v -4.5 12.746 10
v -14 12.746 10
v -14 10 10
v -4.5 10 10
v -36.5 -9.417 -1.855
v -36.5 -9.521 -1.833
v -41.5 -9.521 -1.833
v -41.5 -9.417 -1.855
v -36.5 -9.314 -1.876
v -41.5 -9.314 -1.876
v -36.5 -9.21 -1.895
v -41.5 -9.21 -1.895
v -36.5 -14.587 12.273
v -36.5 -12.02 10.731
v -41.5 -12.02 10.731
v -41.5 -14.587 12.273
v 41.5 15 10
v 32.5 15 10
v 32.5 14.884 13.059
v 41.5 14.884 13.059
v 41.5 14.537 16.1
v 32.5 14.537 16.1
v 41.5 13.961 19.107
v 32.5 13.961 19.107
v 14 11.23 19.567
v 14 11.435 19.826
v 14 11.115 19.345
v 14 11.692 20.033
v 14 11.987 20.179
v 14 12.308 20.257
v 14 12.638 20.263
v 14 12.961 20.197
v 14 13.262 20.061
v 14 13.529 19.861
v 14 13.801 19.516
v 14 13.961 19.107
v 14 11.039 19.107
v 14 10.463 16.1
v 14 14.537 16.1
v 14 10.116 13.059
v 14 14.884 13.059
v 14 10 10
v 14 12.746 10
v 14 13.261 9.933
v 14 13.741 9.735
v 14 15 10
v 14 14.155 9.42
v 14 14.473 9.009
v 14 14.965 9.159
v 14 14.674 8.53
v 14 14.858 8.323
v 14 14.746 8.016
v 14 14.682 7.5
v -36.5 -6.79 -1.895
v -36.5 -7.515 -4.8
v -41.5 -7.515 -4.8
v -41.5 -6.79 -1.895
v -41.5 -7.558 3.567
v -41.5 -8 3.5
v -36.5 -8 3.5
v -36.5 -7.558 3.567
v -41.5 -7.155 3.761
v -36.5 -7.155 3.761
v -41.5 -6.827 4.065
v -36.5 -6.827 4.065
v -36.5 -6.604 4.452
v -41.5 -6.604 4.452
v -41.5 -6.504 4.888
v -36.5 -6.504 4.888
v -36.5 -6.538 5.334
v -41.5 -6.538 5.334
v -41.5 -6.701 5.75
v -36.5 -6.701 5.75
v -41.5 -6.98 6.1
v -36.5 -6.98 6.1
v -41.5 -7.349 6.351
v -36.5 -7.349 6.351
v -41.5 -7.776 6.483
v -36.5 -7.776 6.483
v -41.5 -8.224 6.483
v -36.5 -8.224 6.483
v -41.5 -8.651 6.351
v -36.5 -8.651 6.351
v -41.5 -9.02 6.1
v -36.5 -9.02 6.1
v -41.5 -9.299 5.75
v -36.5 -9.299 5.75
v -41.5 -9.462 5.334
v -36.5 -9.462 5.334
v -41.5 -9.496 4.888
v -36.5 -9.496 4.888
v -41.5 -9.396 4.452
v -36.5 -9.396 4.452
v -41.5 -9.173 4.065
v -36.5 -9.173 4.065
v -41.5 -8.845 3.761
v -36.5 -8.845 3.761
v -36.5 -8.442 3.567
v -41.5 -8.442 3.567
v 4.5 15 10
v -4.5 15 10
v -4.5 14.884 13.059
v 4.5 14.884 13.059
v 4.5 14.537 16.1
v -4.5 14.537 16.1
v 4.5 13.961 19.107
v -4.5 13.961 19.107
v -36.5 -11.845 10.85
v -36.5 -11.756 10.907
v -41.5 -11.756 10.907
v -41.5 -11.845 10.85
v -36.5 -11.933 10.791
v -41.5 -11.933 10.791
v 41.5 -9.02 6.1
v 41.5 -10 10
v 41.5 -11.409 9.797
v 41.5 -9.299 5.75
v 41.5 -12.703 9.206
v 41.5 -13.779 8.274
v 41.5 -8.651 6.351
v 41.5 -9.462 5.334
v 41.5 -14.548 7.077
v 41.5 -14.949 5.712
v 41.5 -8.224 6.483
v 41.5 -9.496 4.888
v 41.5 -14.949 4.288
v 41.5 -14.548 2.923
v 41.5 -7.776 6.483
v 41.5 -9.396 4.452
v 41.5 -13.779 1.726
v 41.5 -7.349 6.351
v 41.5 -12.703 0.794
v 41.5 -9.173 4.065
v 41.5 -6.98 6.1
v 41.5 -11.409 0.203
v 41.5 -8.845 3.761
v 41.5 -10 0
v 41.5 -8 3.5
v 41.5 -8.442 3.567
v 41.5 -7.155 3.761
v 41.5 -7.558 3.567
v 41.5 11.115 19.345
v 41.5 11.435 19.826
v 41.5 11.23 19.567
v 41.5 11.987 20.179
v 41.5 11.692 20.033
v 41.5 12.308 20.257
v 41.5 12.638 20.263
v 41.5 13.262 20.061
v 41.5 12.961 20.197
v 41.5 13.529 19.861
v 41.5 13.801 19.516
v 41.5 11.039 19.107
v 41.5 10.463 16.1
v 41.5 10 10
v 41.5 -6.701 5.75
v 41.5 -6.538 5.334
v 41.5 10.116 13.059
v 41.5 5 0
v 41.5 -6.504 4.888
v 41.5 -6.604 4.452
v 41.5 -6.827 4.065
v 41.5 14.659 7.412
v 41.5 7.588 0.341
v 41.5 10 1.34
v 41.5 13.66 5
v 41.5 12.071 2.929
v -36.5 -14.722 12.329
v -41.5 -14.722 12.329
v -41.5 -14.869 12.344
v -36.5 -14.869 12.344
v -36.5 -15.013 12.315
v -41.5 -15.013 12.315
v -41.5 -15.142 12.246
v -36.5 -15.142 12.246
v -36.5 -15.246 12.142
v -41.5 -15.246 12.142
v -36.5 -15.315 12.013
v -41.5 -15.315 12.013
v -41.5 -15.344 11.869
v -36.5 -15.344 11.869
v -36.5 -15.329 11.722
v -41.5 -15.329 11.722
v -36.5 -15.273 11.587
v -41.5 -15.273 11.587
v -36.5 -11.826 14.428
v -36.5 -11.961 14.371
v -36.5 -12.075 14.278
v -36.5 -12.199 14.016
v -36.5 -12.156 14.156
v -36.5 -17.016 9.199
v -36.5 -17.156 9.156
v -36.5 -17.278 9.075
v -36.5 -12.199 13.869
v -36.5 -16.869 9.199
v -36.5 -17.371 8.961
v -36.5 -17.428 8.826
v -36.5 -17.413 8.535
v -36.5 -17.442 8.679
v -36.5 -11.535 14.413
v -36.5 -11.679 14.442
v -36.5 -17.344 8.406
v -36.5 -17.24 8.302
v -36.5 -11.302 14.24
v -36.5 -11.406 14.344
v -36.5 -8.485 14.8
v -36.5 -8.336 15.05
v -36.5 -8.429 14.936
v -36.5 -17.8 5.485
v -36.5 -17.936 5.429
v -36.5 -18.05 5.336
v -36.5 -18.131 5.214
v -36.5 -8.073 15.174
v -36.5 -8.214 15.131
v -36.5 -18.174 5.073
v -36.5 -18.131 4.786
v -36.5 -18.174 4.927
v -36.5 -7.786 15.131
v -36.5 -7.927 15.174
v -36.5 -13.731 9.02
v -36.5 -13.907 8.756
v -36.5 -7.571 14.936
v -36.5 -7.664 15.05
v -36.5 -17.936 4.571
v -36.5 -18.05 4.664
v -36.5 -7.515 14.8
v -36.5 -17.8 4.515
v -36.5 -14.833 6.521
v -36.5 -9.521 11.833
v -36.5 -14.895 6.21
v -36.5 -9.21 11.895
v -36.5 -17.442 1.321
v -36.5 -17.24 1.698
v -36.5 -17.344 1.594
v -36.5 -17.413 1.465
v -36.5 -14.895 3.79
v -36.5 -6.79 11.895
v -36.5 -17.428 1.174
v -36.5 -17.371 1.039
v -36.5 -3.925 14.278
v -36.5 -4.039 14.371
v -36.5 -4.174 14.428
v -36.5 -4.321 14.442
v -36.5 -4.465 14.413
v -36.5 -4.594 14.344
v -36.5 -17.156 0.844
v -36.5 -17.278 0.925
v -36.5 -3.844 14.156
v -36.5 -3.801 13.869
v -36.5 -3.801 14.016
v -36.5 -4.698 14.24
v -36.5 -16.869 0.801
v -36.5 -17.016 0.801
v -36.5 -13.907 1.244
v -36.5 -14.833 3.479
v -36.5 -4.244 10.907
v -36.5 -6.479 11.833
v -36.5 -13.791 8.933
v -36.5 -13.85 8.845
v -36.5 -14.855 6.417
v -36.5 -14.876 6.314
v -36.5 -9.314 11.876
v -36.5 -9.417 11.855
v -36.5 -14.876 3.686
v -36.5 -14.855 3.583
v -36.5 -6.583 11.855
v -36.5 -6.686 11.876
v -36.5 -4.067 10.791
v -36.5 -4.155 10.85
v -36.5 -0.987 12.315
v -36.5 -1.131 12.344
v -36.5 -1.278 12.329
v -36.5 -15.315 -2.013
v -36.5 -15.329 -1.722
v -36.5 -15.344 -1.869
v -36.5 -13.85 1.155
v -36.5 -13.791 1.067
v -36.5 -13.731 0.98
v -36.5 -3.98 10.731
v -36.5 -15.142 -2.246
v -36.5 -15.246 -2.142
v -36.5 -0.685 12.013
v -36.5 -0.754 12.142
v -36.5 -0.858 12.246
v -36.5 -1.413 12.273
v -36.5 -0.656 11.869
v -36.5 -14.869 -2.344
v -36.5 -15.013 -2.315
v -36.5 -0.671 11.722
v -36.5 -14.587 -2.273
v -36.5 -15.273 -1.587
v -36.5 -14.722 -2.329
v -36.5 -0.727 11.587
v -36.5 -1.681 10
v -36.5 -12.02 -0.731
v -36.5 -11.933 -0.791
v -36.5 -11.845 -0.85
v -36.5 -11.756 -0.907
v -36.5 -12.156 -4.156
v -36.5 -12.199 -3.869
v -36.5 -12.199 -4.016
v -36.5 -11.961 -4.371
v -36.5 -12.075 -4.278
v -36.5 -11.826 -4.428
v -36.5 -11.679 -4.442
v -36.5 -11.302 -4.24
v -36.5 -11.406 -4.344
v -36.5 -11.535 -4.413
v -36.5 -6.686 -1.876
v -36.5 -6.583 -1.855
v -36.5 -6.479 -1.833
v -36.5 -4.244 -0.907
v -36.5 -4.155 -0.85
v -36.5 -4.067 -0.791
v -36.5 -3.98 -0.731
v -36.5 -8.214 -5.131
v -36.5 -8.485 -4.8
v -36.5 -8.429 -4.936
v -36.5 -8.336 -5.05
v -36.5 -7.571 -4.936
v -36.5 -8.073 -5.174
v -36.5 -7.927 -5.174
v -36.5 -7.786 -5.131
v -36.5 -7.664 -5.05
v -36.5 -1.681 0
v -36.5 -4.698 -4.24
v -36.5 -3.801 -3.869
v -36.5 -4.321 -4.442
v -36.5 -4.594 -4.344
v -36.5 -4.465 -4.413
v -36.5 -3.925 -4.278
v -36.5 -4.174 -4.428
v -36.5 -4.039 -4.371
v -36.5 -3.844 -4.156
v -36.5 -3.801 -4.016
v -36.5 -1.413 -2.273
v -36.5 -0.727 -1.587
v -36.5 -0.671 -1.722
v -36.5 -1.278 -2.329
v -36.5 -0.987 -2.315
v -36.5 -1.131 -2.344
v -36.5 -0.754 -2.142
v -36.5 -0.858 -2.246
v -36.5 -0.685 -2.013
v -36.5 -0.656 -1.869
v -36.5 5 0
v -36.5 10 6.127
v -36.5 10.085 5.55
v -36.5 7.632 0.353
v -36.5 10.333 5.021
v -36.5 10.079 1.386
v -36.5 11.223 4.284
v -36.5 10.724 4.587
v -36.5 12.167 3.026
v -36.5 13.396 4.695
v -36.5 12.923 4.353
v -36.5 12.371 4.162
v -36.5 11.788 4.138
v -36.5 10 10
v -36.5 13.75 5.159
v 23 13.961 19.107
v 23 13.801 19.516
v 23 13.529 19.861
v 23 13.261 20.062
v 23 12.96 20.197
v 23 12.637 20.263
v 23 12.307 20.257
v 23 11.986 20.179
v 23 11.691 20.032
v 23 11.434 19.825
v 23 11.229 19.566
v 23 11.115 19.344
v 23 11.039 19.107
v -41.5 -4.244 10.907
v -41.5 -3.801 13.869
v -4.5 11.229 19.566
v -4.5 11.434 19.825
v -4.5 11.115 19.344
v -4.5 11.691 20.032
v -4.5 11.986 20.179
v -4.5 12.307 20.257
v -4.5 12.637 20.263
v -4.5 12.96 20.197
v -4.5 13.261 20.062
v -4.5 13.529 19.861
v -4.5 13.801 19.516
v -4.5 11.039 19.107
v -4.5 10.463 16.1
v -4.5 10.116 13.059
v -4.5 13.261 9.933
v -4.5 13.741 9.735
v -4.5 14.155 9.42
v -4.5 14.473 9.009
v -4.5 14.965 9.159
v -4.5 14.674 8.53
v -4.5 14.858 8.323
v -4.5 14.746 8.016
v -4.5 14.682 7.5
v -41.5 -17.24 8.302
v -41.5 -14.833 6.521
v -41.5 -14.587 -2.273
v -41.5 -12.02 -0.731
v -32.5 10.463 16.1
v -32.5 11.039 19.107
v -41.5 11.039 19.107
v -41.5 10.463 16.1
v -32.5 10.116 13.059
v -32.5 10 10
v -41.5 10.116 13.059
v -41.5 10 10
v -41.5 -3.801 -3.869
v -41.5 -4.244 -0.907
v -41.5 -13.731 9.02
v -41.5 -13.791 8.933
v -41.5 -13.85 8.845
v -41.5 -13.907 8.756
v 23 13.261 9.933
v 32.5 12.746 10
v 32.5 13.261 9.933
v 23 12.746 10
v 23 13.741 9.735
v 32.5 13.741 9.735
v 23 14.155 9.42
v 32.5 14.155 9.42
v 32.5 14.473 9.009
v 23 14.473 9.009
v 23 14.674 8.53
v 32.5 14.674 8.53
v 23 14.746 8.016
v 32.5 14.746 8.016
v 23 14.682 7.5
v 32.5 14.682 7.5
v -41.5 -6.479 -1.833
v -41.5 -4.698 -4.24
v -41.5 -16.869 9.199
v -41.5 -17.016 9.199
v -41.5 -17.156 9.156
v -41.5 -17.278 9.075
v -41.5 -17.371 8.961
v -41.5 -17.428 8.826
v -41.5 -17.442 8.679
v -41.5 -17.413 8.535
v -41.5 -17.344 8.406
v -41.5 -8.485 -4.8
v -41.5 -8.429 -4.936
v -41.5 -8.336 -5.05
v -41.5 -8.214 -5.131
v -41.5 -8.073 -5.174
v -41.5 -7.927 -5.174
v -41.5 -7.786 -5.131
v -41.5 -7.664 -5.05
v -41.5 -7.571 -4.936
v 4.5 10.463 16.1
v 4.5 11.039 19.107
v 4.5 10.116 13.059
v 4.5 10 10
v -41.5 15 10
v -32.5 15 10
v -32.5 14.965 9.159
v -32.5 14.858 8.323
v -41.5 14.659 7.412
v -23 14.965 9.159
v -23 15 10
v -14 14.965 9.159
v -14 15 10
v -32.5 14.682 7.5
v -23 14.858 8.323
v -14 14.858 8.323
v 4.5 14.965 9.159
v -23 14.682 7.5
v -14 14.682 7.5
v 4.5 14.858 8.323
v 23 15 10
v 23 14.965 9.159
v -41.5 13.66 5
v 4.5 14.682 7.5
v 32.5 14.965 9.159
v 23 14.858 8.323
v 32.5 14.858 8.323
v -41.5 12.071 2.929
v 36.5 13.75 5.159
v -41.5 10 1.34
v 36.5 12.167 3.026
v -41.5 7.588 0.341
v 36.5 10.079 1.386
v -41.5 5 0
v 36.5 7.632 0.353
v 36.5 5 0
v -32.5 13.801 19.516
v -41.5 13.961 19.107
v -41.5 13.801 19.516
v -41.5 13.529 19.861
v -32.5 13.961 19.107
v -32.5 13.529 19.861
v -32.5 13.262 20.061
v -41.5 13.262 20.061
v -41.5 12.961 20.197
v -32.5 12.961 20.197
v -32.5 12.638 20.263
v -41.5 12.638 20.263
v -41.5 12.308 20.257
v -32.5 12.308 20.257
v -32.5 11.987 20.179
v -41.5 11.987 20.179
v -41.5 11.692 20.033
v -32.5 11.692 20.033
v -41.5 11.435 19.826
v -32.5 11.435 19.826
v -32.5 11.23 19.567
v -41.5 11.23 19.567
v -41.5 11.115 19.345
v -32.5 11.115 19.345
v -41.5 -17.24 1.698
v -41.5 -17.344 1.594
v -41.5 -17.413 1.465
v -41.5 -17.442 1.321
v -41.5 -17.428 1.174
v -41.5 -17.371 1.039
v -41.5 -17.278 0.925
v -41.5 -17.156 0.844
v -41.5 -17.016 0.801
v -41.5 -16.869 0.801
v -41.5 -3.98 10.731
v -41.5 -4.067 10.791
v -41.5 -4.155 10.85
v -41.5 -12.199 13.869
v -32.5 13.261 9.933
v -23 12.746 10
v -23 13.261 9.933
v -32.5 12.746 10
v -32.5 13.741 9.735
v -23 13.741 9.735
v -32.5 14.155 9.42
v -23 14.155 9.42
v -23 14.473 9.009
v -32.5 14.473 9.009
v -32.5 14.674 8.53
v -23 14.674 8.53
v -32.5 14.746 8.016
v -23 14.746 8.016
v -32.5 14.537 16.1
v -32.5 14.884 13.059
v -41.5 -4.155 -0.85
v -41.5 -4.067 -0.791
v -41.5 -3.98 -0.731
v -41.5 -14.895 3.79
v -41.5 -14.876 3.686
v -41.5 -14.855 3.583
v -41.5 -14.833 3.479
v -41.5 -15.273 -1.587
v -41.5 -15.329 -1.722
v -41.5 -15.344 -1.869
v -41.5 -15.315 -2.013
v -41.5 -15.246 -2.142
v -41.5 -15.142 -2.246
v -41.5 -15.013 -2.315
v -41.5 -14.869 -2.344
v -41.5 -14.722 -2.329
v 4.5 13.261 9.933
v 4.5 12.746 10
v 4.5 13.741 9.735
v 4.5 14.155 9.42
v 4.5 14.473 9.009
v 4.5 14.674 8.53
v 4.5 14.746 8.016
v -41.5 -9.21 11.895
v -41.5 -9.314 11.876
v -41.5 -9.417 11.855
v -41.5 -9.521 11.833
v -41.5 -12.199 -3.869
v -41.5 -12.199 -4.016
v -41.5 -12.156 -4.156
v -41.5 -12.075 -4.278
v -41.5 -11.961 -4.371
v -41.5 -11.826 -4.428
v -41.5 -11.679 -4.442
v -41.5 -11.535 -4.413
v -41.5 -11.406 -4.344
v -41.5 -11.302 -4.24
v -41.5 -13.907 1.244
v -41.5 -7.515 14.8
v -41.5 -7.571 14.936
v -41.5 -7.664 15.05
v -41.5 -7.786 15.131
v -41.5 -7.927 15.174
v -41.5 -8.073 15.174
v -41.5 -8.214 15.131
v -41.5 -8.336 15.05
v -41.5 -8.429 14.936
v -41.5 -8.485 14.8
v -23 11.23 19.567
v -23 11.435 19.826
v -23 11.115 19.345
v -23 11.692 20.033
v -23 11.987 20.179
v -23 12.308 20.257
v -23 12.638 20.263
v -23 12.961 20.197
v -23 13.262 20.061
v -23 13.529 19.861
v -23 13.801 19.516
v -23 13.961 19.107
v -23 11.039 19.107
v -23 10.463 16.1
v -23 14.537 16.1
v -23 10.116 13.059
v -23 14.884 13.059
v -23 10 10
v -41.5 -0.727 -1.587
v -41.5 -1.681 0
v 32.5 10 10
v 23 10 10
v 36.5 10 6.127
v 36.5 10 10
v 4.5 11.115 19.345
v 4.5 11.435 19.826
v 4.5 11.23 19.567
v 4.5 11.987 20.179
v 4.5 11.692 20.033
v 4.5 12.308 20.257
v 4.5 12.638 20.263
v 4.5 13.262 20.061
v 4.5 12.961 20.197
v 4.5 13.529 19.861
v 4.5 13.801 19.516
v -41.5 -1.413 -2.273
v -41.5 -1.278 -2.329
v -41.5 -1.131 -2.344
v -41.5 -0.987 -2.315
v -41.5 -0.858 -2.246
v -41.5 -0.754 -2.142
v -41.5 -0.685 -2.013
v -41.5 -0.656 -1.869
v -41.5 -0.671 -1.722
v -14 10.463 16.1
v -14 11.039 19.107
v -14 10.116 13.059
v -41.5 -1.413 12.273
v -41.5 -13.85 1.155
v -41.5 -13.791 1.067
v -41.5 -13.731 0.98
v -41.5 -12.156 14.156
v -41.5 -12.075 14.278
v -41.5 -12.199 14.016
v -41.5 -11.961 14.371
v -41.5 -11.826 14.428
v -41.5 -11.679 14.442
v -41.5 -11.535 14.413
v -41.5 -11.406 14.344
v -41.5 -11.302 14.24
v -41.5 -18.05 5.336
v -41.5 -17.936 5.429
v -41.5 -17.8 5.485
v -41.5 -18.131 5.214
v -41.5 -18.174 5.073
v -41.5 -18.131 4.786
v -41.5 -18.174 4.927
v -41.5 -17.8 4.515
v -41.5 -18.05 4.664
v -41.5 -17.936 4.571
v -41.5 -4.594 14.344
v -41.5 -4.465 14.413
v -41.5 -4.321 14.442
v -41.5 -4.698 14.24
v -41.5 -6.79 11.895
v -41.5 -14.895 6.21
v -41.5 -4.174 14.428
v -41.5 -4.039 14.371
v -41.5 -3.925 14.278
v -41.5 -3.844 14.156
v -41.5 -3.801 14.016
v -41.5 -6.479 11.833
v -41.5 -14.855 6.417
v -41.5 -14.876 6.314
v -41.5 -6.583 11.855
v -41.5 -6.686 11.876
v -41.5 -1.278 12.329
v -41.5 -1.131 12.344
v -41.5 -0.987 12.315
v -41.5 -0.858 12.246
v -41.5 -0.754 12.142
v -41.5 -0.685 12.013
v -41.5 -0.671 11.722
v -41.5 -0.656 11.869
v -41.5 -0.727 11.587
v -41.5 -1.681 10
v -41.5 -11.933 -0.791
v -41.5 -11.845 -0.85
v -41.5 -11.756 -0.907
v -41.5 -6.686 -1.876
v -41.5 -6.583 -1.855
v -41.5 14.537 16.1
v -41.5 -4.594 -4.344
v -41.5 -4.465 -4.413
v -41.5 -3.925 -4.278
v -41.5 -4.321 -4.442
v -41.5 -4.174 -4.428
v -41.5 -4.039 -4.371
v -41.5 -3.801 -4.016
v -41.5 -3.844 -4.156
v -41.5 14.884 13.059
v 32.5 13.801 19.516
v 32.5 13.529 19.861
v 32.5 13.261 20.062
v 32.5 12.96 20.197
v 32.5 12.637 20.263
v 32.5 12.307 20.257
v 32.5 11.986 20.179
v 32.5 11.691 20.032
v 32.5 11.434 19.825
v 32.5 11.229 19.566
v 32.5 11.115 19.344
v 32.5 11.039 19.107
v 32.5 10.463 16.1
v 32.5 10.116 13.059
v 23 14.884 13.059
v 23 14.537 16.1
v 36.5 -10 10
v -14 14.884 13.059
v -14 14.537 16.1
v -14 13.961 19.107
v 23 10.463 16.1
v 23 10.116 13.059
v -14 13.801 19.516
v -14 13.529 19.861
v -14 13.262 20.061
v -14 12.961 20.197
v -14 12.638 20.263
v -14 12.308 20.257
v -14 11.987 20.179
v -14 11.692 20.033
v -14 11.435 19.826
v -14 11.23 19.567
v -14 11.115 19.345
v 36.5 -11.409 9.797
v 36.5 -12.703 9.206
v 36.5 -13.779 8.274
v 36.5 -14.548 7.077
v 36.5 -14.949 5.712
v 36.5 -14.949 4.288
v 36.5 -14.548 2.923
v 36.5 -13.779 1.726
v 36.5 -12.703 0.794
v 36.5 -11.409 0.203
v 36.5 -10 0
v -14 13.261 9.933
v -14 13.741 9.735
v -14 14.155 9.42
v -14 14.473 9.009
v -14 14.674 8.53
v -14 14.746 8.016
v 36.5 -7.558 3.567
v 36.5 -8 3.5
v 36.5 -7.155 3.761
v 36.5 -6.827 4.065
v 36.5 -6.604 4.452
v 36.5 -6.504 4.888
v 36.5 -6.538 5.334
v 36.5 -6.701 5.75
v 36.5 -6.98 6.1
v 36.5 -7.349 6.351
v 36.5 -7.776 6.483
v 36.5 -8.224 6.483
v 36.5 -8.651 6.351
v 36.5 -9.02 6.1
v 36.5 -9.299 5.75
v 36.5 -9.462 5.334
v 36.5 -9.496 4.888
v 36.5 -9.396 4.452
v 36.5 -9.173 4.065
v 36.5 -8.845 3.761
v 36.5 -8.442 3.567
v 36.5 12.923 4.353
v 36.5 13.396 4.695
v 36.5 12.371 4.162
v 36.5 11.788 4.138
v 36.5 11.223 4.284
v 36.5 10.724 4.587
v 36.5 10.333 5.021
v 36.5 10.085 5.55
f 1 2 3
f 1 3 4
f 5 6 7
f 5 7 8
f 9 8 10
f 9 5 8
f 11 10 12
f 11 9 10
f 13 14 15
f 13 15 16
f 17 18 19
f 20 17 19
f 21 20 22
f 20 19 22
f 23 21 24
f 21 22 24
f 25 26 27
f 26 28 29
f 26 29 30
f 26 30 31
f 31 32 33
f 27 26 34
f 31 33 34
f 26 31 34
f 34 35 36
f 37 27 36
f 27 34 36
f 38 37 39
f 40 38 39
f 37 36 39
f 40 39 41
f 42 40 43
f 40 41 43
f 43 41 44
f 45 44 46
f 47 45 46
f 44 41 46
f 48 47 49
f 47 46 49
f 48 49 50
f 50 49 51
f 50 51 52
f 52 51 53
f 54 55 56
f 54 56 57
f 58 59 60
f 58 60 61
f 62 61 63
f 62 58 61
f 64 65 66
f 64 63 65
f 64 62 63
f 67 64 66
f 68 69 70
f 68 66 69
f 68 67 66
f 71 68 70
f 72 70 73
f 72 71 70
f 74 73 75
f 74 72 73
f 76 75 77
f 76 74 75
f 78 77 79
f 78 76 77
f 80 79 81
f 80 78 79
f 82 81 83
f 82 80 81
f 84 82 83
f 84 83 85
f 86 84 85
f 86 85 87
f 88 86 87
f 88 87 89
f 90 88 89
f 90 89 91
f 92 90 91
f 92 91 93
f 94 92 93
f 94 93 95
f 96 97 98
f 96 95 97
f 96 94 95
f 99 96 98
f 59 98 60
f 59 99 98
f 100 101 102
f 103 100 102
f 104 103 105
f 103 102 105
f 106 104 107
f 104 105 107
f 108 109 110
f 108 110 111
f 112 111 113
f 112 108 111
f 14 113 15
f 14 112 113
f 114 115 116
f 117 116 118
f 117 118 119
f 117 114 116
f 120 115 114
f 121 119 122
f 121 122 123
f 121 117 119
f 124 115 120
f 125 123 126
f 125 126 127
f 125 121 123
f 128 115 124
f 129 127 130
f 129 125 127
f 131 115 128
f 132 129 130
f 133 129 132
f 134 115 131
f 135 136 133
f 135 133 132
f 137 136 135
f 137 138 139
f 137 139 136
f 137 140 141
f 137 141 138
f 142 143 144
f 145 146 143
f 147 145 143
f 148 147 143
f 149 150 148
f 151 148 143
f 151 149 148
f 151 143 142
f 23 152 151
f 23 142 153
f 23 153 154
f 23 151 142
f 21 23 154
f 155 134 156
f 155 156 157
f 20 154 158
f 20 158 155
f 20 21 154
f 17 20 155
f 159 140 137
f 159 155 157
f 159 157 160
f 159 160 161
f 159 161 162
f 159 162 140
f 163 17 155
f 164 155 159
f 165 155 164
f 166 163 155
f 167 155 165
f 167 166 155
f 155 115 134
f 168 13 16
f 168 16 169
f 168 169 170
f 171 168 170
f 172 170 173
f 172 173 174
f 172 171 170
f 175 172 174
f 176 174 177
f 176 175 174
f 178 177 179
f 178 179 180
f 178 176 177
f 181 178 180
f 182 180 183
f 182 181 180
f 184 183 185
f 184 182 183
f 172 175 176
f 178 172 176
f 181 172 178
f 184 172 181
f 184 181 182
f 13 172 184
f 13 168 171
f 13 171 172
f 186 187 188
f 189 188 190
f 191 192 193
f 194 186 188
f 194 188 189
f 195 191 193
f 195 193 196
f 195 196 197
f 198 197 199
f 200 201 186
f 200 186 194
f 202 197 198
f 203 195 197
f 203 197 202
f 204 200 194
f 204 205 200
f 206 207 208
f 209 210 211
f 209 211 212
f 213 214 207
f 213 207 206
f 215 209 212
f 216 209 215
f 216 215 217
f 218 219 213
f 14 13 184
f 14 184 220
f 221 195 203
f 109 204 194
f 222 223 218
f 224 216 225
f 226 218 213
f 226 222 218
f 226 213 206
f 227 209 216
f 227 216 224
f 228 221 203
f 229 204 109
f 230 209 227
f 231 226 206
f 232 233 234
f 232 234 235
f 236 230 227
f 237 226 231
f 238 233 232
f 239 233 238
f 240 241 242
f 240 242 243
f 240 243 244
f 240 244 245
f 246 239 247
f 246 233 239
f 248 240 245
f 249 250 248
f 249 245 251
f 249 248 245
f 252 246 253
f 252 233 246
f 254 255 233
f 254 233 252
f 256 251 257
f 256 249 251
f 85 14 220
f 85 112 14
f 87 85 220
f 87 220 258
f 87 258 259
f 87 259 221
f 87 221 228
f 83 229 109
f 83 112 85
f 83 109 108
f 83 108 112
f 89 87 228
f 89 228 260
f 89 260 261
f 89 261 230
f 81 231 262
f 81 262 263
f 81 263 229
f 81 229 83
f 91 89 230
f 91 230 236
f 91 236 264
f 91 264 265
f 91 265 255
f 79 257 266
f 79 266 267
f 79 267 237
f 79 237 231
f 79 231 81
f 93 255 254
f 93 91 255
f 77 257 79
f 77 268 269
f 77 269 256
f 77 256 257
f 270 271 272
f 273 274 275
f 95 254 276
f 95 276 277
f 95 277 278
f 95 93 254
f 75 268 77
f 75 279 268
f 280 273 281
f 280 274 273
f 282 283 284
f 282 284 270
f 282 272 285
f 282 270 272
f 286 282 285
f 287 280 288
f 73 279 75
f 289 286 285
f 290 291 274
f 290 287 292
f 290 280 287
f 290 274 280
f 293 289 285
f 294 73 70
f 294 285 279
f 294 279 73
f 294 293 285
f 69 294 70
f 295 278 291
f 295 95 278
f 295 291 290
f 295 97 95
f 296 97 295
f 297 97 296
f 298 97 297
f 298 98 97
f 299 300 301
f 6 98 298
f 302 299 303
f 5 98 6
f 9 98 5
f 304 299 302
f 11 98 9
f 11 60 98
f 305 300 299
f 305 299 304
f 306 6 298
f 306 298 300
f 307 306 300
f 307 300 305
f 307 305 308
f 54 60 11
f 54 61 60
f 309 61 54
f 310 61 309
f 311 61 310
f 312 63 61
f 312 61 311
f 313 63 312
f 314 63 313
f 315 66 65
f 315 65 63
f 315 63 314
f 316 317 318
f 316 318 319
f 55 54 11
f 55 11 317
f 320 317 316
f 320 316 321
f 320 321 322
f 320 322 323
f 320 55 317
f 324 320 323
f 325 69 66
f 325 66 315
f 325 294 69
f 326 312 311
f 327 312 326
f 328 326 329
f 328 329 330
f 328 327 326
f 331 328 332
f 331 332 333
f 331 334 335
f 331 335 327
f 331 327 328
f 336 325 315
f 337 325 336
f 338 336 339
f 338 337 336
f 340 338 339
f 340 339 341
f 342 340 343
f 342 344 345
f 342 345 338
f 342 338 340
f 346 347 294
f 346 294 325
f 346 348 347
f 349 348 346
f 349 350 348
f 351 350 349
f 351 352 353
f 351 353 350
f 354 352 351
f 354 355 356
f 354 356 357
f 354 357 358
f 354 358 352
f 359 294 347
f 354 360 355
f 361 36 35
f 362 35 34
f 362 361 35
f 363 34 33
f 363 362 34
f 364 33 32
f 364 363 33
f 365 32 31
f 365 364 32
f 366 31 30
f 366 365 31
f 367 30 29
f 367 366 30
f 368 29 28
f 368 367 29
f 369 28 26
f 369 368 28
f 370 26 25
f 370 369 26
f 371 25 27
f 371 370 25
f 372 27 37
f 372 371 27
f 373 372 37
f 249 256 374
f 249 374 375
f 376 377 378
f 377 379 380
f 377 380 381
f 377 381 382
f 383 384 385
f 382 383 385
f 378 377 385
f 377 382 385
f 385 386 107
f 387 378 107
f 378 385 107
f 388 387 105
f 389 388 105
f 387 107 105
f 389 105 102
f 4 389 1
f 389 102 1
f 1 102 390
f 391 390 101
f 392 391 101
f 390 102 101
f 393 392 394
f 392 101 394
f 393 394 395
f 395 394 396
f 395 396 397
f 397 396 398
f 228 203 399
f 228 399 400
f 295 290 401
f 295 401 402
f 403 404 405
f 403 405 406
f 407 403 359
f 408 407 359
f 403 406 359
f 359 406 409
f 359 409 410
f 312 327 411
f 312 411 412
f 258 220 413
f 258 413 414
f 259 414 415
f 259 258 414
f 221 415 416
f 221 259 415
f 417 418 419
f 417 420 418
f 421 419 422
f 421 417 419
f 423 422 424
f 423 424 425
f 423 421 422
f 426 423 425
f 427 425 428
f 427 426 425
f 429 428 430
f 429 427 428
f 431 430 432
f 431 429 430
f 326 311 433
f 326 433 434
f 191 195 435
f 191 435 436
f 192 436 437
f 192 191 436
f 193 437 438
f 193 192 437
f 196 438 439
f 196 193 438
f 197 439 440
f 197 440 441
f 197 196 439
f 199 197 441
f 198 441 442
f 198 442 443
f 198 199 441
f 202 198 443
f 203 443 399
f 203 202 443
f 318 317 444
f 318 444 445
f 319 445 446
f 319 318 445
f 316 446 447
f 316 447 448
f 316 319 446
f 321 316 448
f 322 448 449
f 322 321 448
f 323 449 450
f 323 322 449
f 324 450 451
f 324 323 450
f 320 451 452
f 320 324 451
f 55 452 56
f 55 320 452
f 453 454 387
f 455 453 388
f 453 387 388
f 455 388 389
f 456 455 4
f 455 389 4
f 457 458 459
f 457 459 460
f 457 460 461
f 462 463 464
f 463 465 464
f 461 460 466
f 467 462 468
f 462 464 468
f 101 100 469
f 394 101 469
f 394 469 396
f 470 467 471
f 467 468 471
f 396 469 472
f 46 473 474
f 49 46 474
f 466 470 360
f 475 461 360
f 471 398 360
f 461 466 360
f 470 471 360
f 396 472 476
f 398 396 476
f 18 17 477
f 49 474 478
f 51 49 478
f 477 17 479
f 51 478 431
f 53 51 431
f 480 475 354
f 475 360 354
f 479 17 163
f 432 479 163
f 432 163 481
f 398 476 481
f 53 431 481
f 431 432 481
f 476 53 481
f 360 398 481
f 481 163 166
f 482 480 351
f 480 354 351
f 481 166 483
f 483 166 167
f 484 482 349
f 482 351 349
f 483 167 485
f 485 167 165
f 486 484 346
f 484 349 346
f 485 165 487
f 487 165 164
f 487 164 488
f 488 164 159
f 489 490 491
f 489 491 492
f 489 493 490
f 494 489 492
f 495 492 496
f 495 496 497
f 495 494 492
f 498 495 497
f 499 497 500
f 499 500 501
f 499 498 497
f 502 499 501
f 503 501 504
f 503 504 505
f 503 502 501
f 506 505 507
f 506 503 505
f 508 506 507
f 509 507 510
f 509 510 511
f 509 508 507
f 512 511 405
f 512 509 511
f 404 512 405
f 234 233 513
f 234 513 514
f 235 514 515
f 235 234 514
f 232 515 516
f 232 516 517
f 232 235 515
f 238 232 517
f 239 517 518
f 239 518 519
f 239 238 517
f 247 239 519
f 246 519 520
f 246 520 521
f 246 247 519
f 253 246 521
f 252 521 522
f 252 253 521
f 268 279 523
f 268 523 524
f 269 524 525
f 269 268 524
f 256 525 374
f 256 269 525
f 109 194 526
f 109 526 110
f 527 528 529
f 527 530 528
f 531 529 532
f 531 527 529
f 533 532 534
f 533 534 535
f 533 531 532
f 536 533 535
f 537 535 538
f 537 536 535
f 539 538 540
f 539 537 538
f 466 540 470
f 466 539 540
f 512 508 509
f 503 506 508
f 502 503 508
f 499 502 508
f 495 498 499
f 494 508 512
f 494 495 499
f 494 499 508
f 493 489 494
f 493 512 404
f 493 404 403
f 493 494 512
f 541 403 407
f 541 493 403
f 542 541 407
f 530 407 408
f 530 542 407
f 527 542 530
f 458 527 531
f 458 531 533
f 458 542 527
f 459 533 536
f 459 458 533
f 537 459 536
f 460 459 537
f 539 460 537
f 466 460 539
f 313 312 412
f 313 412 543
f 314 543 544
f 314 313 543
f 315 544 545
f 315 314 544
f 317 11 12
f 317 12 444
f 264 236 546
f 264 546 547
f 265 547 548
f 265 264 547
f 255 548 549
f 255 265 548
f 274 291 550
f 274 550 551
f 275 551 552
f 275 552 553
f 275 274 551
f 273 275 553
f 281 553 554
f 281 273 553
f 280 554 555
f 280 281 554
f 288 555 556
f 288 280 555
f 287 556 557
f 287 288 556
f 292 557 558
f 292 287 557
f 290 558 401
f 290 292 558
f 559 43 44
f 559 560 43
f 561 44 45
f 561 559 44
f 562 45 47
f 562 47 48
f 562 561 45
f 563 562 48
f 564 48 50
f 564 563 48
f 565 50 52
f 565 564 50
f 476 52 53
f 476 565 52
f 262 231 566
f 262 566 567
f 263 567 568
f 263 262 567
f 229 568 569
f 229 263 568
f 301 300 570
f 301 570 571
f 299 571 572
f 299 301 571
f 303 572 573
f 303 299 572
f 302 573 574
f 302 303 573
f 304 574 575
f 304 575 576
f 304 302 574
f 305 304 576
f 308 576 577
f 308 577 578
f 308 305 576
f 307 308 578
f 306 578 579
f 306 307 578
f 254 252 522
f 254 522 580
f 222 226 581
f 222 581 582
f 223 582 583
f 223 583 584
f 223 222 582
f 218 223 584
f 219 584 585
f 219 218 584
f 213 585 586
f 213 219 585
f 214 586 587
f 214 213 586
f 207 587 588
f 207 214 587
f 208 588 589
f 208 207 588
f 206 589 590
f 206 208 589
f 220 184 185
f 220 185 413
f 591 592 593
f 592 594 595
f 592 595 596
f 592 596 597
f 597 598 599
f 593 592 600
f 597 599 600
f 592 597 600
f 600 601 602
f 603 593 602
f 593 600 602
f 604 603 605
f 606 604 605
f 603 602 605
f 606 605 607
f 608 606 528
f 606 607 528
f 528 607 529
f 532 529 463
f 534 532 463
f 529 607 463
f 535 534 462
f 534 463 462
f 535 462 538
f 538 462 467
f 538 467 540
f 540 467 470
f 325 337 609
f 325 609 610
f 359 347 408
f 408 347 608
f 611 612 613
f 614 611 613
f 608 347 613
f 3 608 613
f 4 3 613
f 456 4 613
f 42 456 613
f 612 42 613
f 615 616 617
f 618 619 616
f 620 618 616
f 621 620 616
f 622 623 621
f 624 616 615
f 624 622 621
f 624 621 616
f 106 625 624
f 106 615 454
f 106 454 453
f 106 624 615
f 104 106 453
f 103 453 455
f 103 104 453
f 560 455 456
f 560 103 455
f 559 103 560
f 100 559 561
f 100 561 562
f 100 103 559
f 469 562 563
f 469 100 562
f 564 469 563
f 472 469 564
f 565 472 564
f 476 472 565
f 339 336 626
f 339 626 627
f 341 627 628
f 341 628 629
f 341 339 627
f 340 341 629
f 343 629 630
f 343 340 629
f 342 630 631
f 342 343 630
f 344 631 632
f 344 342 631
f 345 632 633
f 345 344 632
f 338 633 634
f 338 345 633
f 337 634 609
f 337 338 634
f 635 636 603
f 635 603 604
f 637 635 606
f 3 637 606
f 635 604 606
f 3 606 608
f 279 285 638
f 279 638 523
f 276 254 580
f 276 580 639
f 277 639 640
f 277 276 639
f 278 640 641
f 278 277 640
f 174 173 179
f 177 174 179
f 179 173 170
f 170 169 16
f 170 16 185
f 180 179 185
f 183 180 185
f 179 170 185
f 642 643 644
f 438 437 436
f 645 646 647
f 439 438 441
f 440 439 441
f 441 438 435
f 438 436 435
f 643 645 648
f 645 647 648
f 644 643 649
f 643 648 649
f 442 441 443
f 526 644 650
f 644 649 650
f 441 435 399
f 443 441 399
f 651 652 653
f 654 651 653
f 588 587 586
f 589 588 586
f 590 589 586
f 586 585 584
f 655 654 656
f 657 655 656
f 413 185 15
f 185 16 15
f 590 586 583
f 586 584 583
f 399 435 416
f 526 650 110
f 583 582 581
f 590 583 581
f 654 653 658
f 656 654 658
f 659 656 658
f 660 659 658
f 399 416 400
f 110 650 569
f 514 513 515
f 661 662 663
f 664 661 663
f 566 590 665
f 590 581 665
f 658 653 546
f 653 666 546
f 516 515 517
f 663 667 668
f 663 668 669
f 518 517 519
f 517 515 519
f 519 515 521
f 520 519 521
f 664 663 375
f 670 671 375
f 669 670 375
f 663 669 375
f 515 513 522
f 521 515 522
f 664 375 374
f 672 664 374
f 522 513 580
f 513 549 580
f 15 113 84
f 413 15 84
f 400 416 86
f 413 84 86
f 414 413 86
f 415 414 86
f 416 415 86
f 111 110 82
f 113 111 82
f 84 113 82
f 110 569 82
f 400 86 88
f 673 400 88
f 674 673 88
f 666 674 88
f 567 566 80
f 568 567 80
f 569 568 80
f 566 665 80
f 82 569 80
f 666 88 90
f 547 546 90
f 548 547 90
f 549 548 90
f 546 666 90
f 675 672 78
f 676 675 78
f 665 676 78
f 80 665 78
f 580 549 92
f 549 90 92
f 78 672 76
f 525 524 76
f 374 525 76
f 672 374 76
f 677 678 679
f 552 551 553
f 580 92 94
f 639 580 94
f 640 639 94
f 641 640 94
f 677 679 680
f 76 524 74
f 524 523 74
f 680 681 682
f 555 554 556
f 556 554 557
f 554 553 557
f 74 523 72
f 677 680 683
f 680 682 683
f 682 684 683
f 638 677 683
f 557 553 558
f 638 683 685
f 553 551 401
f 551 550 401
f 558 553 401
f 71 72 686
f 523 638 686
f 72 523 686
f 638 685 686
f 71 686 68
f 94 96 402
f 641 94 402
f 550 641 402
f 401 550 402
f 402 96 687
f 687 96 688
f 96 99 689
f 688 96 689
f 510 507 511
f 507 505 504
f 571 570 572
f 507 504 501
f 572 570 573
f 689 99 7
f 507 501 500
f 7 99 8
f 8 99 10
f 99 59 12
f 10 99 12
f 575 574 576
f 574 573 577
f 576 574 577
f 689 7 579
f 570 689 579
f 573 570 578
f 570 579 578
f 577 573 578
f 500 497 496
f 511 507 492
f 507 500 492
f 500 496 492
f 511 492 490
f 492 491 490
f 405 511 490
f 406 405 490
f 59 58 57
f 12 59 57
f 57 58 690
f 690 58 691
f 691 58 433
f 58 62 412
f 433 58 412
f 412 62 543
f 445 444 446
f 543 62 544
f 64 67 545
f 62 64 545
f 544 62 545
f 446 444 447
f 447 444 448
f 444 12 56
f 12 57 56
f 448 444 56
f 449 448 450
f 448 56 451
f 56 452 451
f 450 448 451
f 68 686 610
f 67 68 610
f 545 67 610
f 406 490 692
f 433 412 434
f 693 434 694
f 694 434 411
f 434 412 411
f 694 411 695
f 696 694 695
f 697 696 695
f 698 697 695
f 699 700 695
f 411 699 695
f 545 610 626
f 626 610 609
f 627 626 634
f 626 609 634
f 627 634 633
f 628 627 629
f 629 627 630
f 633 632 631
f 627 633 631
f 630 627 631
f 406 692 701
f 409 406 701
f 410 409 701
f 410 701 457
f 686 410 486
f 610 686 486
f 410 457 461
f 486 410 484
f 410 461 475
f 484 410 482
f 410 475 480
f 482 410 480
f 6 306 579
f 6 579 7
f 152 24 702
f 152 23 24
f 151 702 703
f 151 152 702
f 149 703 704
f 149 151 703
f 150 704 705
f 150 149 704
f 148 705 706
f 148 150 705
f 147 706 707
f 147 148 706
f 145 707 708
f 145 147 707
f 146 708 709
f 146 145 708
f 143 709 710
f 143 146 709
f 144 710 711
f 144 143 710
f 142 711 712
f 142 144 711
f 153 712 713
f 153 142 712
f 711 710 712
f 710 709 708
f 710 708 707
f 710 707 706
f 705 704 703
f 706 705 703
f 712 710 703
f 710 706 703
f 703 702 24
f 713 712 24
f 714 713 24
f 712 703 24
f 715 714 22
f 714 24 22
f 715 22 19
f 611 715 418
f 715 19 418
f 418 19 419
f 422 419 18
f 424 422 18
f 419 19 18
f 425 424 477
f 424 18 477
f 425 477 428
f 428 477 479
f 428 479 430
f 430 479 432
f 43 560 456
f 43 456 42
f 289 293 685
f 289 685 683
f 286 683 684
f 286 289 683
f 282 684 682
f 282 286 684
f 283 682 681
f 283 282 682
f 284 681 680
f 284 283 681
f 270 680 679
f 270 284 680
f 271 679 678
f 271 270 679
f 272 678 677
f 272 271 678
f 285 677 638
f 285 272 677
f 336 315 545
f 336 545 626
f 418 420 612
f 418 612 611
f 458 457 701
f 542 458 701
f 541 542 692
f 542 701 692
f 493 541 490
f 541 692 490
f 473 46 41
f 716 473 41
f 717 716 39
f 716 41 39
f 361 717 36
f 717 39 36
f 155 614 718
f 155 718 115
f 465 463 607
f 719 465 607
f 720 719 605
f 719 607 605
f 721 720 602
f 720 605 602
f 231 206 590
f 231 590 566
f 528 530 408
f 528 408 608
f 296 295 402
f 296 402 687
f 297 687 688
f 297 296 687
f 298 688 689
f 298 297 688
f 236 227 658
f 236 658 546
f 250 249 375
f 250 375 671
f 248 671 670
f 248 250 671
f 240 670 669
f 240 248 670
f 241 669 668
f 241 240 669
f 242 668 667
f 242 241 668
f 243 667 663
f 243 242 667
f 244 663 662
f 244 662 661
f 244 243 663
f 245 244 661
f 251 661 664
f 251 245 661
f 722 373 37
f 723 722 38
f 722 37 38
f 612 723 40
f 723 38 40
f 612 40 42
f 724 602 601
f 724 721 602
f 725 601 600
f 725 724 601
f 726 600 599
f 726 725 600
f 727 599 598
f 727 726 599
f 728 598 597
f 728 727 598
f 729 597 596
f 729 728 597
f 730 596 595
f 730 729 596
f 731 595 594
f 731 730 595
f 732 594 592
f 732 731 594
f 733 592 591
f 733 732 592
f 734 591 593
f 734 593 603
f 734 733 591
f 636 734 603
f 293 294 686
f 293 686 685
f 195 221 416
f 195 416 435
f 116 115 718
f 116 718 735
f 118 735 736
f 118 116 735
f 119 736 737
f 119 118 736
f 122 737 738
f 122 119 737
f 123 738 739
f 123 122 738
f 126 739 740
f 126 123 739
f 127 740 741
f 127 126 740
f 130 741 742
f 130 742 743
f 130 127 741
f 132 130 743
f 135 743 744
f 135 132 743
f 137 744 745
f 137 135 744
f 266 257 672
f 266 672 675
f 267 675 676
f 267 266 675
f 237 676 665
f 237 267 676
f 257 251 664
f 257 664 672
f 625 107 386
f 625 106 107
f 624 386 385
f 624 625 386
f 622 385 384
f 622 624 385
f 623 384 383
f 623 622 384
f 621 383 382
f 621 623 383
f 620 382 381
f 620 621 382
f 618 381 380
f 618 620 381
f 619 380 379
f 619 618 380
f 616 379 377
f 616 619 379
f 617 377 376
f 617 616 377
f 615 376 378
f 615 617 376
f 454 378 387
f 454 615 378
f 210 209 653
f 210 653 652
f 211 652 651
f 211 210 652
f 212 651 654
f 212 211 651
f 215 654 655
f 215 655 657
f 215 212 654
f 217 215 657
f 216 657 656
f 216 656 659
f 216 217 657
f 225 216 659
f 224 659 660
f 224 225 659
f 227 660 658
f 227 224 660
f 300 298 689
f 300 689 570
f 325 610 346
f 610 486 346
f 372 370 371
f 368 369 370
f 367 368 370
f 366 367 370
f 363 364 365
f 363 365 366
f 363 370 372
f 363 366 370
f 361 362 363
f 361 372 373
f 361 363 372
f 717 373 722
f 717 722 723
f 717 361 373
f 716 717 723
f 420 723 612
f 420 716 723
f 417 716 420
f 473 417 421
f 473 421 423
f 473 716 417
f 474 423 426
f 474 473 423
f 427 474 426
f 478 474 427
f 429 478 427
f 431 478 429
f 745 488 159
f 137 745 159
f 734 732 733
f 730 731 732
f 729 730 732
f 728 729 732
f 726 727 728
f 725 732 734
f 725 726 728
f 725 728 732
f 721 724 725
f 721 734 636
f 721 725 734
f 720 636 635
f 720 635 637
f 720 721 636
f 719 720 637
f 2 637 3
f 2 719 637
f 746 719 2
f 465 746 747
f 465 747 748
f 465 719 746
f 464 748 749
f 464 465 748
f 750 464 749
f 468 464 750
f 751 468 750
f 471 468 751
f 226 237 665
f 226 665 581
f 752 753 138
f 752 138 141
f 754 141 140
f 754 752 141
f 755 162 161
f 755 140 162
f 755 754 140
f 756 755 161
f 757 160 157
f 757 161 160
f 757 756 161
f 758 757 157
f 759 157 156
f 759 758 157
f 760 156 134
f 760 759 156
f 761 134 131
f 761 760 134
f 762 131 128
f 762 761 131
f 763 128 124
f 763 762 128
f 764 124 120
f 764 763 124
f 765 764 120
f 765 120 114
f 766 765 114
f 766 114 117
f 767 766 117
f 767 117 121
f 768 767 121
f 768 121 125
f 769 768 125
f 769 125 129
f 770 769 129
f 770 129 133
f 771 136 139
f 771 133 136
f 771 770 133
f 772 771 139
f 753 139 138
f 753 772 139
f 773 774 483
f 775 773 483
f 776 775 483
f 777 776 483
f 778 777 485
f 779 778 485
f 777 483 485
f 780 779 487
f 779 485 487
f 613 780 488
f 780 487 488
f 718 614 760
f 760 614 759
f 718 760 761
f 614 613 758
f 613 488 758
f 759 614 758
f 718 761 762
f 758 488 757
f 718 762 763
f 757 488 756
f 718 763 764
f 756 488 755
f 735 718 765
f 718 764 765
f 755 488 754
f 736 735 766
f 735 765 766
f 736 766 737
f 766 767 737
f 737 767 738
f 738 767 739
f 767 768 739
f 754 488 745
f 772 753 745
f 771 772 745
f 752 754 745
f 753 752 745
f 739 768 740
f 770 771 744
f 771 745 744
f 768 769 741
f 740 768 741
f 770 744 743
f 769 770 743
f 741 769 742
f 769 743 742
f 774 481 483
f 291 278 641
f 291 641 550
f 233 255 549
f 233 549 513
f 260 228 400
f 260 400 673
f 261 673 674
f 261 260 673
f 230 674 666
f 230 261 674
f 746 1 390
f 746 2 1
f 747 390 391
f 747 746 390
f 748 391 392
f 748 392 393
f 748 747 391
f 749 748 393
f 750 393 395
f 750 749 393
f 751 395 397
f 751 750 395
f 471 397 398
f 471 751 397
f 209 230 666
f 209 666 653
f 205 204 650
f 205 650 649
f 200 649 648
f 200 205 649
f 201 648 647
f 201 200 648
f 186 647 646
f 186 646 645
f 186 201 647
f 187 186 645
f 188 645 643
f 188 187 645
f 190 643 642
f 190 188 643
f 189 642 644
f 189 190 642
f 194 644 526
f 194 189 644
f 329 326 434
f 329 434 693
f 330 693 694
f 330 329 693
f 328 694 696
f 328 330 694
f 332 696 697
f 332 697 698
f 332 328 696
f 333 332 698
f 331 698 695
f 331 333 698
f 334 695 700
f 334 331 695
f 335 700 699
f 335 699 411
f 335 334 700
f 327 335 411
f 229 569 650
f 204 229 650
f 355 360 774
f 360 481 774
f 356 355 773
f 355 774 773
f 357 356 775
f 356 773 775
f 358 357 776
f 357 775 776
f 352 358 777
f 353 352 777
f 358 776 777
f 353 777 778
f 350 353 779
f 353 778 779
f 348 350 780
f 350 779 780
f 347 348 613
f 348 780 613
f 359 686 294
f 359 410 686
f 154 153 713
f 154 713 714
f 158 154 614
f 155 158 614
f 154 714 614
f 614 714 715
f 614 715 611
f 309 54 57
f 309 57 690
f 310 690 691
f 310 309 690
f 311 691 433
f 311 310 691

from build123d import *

# Parameters (mm, degrees)
BOSS_EXTRU_1_DEPTH               = 10
BOSS_EXTRU_2_DEPTH               = 9
CONG_1_R                         = 1.5
R_P_TITION_LIN_AIRE1_COUNT       = 5
R_P_TITION_LIN_AIRE1_PITCH       = 18.5
CONG_1_OF_R_P_TITION_LIN_AIRE1_R = 1.5
ENL_V_MAT_EXTRU_1_DEPTH          = 82.974649169
ENL_V_MAT_EXTRU_1_DEPTH_BACK     = 82.974649169
ESQUISSE4_R                      = 1.5
CONG_2_RADIUS                    = 5
CONG_2_LENGTH                    = 5
CONG_3_RADIUS                    = 5
CONG_3_LENGTH                    = 5
CONG_4_R                         = 10
ESQUISSE5_R                      = 1.5
BOSS_EXTRU_3_DEPTH               = 5
CONG_7_R                         = 2
CONG_8_R                         = 2


with BuildPart() as part:
    # Esquisse1 → Boss.-Extru.1 (new body)
    with BuildSketch(Plane.XY):
        Polygon((-36.5, 10), (36.5, 10), (36.5, -10), (36.5, -15), (41.5, -15), (41.5, 15), (-41.5, 15), (-41.5, -15), (-36.5, -15), (-36.5, -10), align=None)
    extrude(amount=BOSS_EXTRU_1_DEPTH)

    # Esquisse2 → Boss.-Extru.2 (add)
    with BuildSketch(Plane.ZY.offset(41.5)):
        with BuildLine():
            Line((10, 10), (10, 15))
            ThreePointArc((10, 15), (17.110731327, 14.370095429), (24, 12.5))
            ThreePointArc((24, 12.5), (17.110731327, 10.629904571), (10, 10))
        make_face()
    boss_extru_2 = extrude(amount=-BOSS_EXTRU_2_DEPTH)

    # Congé1
    cong_1_edges = [part.edges().sort_by_distance(p)[0] for p in [
        (-37, 12.5, 24),
    ]]
    fillet(cong_1_edges, radius=CONG_1_R)

    # Répétition linéaire1: Boss.-Extru.2 ×5
    with Locations(*[(i * R_P_TITION_LIN_AIRE1_PITCH, 0, 0) for i in range(1, R_P_TITION_LIN_AIRE1_COUNT)]):
        add(boss_extru_2)

    # Congé1 of Répétition linéaire1
    cong_1_of_r_p_tition_lin_aire1_edges = [part.edges().sort_by_distance(p)[0] for p in [
        (-18.5, 12.5, 24),
        (0, 12.5, 24),
        (18.5, 12.5, 24),
        (37, 12.5, 24),
    ]]
    fillet(cong_1_of_r_p_tition_lin_aire1_edges, radius=CONG_1_OF_R_P_TITION_LIN_AIRE1_R)

    # Esquisse4 → Enlèv. mat.-Extru.1 (cut, two sides: drawn at the far end of the back side and taken through both)
    with BuildSketch(Plane(origin=(-36.5, 0, 0), x_dir=(0, 0, -1), z_dir=(1, 0, 0)).offset(-ENL_V_MAT_EXTRU_1_DEPTH_BACK)):
        with Locations((-5, -8)):
            Circle(ESQUISSE4_R)
    extrude(amount=ENL_V_MAT_EXTRU_1_DEPTH + ENL_V_MAT_EXTRU_1_DEPTH_BACK, mode=Mode.SUBTRACT)

    # Congé2: full round fillet: the end face becomes a half cylinder, R = half its width
    cong_2_face = Plane((-39, -15, 5), x_dir=(1, 0, 0), z_dir=(0, -1, 0))  # on the end face: x along it, z out of the body
    cong_2_slab = cong_2_face.offset(-CONG_2_RADIUS / 2) * Box(CONG_2_LENGTH, 2 * CONG_2_RADIUS, CONG_2_RADIUS, mode=Mode.PRIVATE)  # the body's end, R deep
    cong_2_round = Plane((-39, -10, 5), x_dir=(0, -1, 0), z_dir=(1, 0, 0)) * Cylinder(CONG_2_RADIUS, CONG_2_LENGTH, mode=Mode.PRIVATE)  # its axis R under the face
    add(cong_2_slab - cong_2_round, mode=Mode.SUBTRACT)

    # Congé3: full round fillet: the end face becomes a half cylinder, R = half its width
    cong_3_face = Plane((39, -15, 5), x_dir=(1, 0, 0), z_dir=(0, -1, 0))  # on the end face: x along it, z out of the body
    cong_3_slab = cong_3_face.offset(-CONG_3_RADIUS / 2) * Box(CONG_3_LENGTH, 2 * CONG_3_RADIUS, CONG_3_RADIUS, mode=Mode.PRIVATE)  # the body's end, R deep
    cong_3_round = Plane((39, -10, 5), x_dir=(0, -1, 0), z_dir=(1, 0, 0)) * Cylinder(CONG_3_RADIUS, CONG_3_LENGTH, mode=Mode.PRIVATE)  # its axis R under the face
    add(cong_3_slab - cong_3_round, mode=Mode.SUBTRACT)

    # Congé4
    # the kernel refuses this fillet: 10 mm, written as the material it takes off along each edge
    with BuildSketch(Plane(origin=(66.5, 15, 0), x_dir=(0, -1, 0), z_dir=(-1, 0, 0))) as cong_4_piece_1:
        with BuildLine():
            CenterArc((CONG_4_R, CONG_4_R), CONG_4_R, 180, 90)
            Line((0, CONG_4_R), (0, 0))
            Line((0, 0), (CONG_4_R, 0))
        make_face()
    extrude(amount=133, mode=Mode.SUBTRACT)

    # Esquisse5 → Boss.-Extru.3 (add, through all)
    with BuildSketch(Plane(origin=(-36.5, 0, 0), x_dir=(0, 0, -1), z_dir=(1, 0, 0))):
        with BuildLine():
            Line((-14.800353701, -8.485147863), (-11.894696869, -9.209609478))
            ThreePointArc((-11.894696869, -9.209609478), (-11.865496963, -9.365632254), (-11.832766827, -9.520952824))
            Line((-11.832766827, -9.520952824), (-14.240004245, -11.302214812))
            ThreePointArc((-14.240004245, -11.302214812), (-14.404532618, -11.895484958), (-13.868688146, -12.198651174))
            Line((-13.868688146, -12.198651174), (-10.906971813, -11.756019702))
            ThreePointArc((-10.906971813, -11.756019702), (-10.820287286, -11.888991631), (-10.730609975, -12.019963846))
            Line((-10.730609975, -12.019963846), (-12.272947904, -14.586845216))
            ThreePointArc((-12.272947904, -14.586845216), (-12.197917644, -15.197917644), (-11.586845216, -15.272947904))
            Line((-11.586845216, -15.272947904), (-9.019963846, -13.730609975))
            ThreePointArc((-9.019963846, -13.730609975), (-8.888991631, -13.820287286), (-8.756019702, -13.906971813))
            Line((-8.756019702, -13.906971813), (-9.198651174, -16.868688146))
            ThreePointArc((-9.198651174, -16.868688146), (-8.895484958, -17.404532618), (-8.302214812, -17.240004245))
            Line((-8.302214812, -17.240004245), (-6.520952824, -14.832766827))
            ThreePointArc((-6.520952824, -14.832766827), (-6.365632254, -14.865496963), (-6.209609478, -14.894696869))
            Line((-6.209609478, -14.894696869), (-5.485147863, -17.800353701))
            ThreePointArc((-5.485147863, -17.800353701), (-5, -18.179392753), (-4.514852137, -17.800353701))
            Line((-4.514852137, -17.800353701), (-3.790390522, -14.894696869))
            ThreePointArc((-3.790390522, -14.894696869), (-3.634367746, -14.865496963), (-3.479047176, -14.832766827))
            Line((-3.479047176, -14.832766827), (-1.697785188, -17.240004245))
            ThreePointArc((-1.697785188, -17.240004245), (-1.104515042, -17.404532618), (-0.801348826, -16.868688146))
            Line((-0.801348826, -16.868688146), (-1.243980298, -13.906971813))
            ThreePointArc((-1.243980298, -13.906971813), (-1.111008369, -13.820287286), (-0.980036154, -13.730609975))
            Line((-0.980036154, -13.730609975), (1.586845216, -15.272947904))
            ThreePointArc((1.586845216, -15.272947904), (2.197917644, -15.197917644), (2.272947904, -14.586845216))
            Line((2.272947904, -14.586845216), (0.730609975, -12.019963846))
            ThreePointArc((0.730609975, -12.019963846), (0.820287286, -11.888991631), (0.906971813, -11.756019702))
            Line((0.906971813, -11.756019702), (3.868688146, -12.198651174))
            ThreePointArc((3.868688146, -12.198651174), (4.404532618, -11.895484958), (4.240004245, -11.302214812))
            Line((4.240004245, -11.302214812), (1.832766827, -9.520952824))
            ThreePointArc((1.832766827, -9.520952824), (1.865496963, -9.365632254), (1.894696869, -9.209609478))
            Line((1.894696869, -9.209609478), (4.800353701, -8.485147863))
            ThreePointArc((4.800353701, -8.485147863), (5.179392753, -8), (4.800353701, -7.514852137))
            Line((4.800353701, -7.514852137), (1.894696869, -6.790390522))
            ThreePointArc((1.894696869, -6.790390522), (1.865496963, -6.634367746), (1.832766827, -6.479047176))
            Line((1.832766827, -6.479047176), (4.240004245, -4.697785188))
            ThreePointArc((4.240004245, -4.697785188), (4.404532618, -4.104515042), (3.868688146, -3.801348826))
            Line((3.868688146, -3.801348826), (0.906971813, -4.243980298))
            ThreePointArc((0.906971813, -4.243980298), (0.820287286, -4.111008369), (0.730609975, -3.980036154))
            Line((0.730609975, -3.980036154), (2.272947904, -1.413154784))
            ThreePointArc((2.272947904, -1.413154784), (2.197917644, -0.802082356), (1.586845216, -0.727052096))
            Line((1.586845216, -0.727052096), (-0.980036154, -2.269390025))
            ThreePointArc((-0.980036154, -2.269390025), (-1.111008369, -2.179712714), (-1.243980298, -2.093028187))
            Line((-1.243980298, -2.093028187), (-0.801348826, 0.868688146))
            ThreePointArc((-0.801348826, 0.868688146), (-1.104515042, 1.404532618), (-1.697785188, 1.240004245))
            Line((-1.697785188, 1.240004245), (-3.479047176, -1.167233173))
            ThreePointArc((-3.479047176, -1.167233173), (-3.634367746, -1.134503037), (-3.790390522, -1.105303131))
            Line((-3.790390522, -1.105303131), (-4.514852137, 1.800353701))
            ThreePointArc((-4.514852137, 1.800353701), (-5, 2.179392753), (-5.485147863, 1.800353701))
            Line((-5.485147863, 1.800353701), (-6.209609478, -1.105303131))
            ThreePointArc((-6.209609478, -1.105303131), (-6.365632254, -1.134503037), (-6.520952824, -1.167233173))
            Line((-6.520952824, -1.167233173), (-8.302214812, 1.240004245))
            ThreePointArc((-8.302214812, 1.240004245), (-8.895484958, 1.404532618), (-9.198651174, 0.868688146))
            Line((-9.198651174, 0.868688146), (-8.756019702, -2.093028187))
            ThreePointArc((-8.756019702, -2.093028187), (-8.888991631, -2.179712714), (-9.019963846, -2.269390025))
            Line((-9.019963846, -2.269390025), (-11.586845216, -0.727052096))
            ThreePointArc((-11.586845216, -0.727052096), (-12.197917644, -0.802082356), (-12.272947904, -1.413154784))
            Line((-12.272947904, -1.413154784), (-10.730609975, -3.980036154))
            ThreePointArc((-10.730609975, -3.980036154), (-10.820287286, -4.111008369), (-10.906971813, -4.243980298))
            Line((-10.906971813, -4.243980298), (-13.868688146, -3.801348826))
            ThreePointArc((-13.868688146, -3.801348826), (-14.404532618, -4.104515042), (-14.240004245, -4.697785188))
            Line((-14.240004245, -4.697785188), (-11.832766827, -6.479047176))
            ThreePointArc((-11.832766827, -6.479047176), (-11.865496963, -6.634367746), (-11.894696869, -6.790390522))
            Line((-11.894696869, -6.790390522), (-14.800353701, -7.514852137))
            ThreePointArc((-14.800353701, -7.514852137), (-15.179392753, -8), (-14.800353701, -8.485147863))
        make_face()
        with Locations((-5, -8)):
            Circle(ESQUISSE5_R, mode=Mode.SUBTRACT)
    extrude(amount=-BOSS_EXTRU_3_DEPTH)

    # Congé7
    cong_7_edges = [part.edges().sort_by_distance(p)[0] for p in [
        (0, 10, 1.339745962),
    ]]
    fillet(cong_7_edges, radius=CONG_7_R)

    # Congé8
    cong_8_edges = [part.edges().sort_by_distance(p)[0] for p in [
        (-27.75, 15, 10),
        (-9.25, 15, 10),
        (9.25, 15, 10),
        (27.75, 15, 10),
    ]]
    fillet(cong_8_edges, radius=CONG_8_R)


solid = part.part
